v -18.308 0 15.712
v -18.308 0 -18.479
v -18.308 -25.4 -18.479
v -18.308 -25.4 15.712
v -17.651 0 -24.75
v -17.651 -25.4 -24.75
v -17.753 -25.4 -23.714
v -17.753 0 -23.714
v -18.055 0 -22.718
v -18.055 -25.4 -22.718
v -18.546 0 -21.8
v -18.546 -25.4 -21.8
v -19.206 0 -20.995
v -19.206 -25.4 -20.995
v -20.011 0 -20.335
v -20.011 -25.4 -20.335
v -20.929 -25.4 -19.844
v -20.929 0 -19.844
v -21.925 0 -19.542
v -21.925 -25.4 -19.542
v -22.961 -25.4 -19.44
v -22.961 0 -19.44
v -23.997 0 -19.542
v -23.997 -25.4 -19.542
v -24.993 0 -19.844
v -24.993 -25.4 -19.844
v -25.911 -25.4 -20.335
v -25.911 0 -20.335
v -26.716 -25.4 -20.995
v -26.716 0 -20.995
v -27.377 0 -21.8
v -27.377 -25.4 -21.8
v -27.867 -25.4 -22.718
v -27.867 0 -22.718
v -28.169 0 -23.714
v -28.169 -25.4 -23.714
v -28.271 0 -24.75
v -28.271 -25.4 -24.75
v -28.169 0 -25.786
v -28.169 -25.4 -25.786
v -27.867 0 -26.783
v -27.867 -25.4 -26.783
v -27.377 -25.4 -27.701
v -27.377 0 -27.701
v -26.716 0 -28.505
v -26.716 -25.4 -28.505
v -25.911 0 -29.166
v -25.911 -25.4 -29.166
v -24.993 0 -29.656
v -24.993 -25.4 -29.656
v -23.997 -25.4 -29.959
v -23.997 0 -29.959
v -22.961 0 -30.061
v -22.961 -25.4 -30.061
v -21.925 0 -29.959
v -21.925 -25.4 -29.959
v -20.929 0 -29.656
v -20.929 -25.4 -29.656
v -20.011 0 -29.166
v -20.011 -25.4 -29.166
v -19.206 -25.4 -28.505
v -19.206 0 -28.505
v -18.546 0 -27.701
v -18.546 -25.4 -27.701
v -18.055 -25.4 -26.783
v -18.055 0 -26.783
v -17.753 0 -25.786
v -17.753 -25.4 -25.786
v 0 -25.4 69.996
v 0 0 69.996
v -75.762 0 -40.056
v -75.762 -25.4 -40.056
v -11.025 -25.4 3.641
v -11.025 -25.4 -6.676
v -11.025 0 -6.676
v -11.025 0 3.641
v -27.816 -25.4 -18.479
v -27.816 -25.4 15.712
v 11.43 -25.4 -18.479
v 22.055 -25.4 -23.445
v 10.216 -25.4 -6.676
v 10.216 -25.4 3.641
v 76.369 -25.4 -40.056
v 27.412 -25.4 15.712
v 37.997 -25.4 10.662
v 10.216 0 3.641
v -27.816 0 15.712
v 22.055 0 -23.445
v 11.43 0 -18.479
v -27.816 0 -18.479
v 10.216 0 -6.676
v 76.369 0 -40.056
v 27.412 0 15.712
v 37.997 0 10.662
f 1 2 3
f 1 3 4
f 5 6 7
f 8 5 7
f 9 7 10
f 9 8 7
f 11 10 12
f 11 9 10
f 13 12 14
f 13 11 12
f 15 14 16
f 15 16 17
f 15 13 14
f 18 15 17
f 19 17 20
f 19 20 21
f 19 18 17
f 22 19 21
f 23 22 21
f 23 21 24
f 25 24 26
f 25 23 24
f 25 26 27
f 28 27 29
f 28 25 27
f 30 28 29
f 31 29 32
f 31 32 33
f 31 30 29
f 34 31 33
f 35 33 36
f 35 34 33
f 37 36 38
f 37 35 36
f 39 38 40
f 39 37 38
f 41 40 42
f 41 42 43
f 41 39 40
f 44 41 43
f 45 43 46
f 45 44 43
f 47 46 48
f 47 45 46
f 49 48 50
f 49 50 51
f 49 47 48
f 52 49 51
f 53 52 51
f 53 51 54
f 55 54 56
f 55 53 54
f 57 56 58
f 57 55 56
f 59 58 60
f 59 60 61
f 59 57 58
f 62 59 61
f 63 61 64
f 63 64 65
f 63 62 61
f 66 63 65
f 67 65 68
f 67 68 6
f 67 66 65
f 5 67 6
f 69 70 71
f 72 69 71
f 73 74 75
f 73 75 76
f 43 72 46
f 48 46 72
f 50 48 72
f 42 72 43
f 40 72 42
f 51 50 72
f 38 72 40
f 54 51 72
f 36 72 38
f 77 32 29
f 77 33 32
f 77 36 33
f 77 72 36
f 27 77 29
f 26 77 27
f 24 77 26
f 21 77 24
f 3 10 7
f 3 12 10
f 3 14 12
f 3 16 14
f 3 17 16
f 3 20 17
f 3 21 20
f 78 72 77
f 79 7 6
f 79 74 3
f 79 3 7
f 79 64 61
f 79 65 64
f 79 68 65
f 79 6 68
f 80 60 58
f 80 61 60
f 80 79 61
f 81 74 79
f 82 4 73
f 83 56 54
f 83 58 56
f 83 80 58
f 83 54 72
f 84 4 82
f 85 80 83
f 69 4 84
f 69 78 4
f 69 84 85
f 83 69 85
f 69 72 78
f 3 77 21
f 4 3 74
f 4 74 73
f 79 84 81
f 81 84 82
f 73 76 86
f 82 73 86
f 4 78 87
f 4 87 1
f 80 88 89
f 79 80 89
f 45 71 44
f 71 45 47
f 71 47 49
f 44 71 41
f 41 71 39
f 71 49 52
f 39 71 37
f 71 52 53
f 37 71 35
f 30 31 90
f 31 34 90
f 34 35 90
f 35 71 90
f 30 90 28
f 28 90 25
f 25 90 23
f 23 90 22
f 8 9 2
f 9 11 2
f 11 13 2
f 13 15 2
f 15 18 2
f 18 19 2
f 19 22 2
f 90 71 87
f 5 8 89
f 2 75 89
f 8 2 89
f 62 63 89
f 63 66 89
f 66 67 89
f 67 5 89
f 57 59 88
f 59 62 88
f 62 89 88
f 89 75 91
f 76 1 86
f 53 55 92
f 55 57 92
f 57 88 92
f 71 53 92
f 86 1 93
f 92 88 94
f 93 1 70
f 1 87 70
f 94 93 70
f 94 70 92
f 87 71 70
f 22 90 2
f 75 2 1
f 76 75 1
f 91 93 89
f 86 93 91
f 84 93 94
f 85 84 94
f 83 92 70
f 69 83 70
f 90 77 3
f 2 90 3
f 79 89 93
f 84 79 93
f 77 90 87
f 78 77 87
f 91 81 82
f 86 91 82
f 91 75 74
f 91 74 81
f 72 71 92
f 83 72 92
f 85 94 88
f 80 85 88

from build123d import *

# Parameters (mm, degrees)
F0_R     = 5.310328
F0_W     = 9.508142
F0_H     = 34.190733
F0_W_2   = 21.241593
F0_H_2   = 10.317345
F1_DEPTH = 25.4


with BuildPart() as f1:
    # F0 (on Front) → F1 (new body)
    with BuildSketch(Plane.XZ):
        Polygon((76.368585, -40.055577), (0, 69.996111), (-75.761683, -40.055577), align=None)
        with Locations((-22.961151, -24.750333)):
            Circle(F0_R, mode=Mode.SUBTRACT)
        with Locations((-23.062301, -1.383293)):
            Rectangle(F0_W, F0_H, mode=Mode.SUBTRACT)
        with Locations((-0.4046, -1.517257)):
            Rectangle(F0_W_2, F0_H_2, mode=Mode.SUBTRACT)
        Polygon((11.430002, -18.47866), (27.411768, 15.712073), (37.997249, 10.662371), (22.054509, -23.444871), align=None, mode=Mode.SUBTRACT)
    extrude(amount=F1_DEPTH)


solid = f1.part
